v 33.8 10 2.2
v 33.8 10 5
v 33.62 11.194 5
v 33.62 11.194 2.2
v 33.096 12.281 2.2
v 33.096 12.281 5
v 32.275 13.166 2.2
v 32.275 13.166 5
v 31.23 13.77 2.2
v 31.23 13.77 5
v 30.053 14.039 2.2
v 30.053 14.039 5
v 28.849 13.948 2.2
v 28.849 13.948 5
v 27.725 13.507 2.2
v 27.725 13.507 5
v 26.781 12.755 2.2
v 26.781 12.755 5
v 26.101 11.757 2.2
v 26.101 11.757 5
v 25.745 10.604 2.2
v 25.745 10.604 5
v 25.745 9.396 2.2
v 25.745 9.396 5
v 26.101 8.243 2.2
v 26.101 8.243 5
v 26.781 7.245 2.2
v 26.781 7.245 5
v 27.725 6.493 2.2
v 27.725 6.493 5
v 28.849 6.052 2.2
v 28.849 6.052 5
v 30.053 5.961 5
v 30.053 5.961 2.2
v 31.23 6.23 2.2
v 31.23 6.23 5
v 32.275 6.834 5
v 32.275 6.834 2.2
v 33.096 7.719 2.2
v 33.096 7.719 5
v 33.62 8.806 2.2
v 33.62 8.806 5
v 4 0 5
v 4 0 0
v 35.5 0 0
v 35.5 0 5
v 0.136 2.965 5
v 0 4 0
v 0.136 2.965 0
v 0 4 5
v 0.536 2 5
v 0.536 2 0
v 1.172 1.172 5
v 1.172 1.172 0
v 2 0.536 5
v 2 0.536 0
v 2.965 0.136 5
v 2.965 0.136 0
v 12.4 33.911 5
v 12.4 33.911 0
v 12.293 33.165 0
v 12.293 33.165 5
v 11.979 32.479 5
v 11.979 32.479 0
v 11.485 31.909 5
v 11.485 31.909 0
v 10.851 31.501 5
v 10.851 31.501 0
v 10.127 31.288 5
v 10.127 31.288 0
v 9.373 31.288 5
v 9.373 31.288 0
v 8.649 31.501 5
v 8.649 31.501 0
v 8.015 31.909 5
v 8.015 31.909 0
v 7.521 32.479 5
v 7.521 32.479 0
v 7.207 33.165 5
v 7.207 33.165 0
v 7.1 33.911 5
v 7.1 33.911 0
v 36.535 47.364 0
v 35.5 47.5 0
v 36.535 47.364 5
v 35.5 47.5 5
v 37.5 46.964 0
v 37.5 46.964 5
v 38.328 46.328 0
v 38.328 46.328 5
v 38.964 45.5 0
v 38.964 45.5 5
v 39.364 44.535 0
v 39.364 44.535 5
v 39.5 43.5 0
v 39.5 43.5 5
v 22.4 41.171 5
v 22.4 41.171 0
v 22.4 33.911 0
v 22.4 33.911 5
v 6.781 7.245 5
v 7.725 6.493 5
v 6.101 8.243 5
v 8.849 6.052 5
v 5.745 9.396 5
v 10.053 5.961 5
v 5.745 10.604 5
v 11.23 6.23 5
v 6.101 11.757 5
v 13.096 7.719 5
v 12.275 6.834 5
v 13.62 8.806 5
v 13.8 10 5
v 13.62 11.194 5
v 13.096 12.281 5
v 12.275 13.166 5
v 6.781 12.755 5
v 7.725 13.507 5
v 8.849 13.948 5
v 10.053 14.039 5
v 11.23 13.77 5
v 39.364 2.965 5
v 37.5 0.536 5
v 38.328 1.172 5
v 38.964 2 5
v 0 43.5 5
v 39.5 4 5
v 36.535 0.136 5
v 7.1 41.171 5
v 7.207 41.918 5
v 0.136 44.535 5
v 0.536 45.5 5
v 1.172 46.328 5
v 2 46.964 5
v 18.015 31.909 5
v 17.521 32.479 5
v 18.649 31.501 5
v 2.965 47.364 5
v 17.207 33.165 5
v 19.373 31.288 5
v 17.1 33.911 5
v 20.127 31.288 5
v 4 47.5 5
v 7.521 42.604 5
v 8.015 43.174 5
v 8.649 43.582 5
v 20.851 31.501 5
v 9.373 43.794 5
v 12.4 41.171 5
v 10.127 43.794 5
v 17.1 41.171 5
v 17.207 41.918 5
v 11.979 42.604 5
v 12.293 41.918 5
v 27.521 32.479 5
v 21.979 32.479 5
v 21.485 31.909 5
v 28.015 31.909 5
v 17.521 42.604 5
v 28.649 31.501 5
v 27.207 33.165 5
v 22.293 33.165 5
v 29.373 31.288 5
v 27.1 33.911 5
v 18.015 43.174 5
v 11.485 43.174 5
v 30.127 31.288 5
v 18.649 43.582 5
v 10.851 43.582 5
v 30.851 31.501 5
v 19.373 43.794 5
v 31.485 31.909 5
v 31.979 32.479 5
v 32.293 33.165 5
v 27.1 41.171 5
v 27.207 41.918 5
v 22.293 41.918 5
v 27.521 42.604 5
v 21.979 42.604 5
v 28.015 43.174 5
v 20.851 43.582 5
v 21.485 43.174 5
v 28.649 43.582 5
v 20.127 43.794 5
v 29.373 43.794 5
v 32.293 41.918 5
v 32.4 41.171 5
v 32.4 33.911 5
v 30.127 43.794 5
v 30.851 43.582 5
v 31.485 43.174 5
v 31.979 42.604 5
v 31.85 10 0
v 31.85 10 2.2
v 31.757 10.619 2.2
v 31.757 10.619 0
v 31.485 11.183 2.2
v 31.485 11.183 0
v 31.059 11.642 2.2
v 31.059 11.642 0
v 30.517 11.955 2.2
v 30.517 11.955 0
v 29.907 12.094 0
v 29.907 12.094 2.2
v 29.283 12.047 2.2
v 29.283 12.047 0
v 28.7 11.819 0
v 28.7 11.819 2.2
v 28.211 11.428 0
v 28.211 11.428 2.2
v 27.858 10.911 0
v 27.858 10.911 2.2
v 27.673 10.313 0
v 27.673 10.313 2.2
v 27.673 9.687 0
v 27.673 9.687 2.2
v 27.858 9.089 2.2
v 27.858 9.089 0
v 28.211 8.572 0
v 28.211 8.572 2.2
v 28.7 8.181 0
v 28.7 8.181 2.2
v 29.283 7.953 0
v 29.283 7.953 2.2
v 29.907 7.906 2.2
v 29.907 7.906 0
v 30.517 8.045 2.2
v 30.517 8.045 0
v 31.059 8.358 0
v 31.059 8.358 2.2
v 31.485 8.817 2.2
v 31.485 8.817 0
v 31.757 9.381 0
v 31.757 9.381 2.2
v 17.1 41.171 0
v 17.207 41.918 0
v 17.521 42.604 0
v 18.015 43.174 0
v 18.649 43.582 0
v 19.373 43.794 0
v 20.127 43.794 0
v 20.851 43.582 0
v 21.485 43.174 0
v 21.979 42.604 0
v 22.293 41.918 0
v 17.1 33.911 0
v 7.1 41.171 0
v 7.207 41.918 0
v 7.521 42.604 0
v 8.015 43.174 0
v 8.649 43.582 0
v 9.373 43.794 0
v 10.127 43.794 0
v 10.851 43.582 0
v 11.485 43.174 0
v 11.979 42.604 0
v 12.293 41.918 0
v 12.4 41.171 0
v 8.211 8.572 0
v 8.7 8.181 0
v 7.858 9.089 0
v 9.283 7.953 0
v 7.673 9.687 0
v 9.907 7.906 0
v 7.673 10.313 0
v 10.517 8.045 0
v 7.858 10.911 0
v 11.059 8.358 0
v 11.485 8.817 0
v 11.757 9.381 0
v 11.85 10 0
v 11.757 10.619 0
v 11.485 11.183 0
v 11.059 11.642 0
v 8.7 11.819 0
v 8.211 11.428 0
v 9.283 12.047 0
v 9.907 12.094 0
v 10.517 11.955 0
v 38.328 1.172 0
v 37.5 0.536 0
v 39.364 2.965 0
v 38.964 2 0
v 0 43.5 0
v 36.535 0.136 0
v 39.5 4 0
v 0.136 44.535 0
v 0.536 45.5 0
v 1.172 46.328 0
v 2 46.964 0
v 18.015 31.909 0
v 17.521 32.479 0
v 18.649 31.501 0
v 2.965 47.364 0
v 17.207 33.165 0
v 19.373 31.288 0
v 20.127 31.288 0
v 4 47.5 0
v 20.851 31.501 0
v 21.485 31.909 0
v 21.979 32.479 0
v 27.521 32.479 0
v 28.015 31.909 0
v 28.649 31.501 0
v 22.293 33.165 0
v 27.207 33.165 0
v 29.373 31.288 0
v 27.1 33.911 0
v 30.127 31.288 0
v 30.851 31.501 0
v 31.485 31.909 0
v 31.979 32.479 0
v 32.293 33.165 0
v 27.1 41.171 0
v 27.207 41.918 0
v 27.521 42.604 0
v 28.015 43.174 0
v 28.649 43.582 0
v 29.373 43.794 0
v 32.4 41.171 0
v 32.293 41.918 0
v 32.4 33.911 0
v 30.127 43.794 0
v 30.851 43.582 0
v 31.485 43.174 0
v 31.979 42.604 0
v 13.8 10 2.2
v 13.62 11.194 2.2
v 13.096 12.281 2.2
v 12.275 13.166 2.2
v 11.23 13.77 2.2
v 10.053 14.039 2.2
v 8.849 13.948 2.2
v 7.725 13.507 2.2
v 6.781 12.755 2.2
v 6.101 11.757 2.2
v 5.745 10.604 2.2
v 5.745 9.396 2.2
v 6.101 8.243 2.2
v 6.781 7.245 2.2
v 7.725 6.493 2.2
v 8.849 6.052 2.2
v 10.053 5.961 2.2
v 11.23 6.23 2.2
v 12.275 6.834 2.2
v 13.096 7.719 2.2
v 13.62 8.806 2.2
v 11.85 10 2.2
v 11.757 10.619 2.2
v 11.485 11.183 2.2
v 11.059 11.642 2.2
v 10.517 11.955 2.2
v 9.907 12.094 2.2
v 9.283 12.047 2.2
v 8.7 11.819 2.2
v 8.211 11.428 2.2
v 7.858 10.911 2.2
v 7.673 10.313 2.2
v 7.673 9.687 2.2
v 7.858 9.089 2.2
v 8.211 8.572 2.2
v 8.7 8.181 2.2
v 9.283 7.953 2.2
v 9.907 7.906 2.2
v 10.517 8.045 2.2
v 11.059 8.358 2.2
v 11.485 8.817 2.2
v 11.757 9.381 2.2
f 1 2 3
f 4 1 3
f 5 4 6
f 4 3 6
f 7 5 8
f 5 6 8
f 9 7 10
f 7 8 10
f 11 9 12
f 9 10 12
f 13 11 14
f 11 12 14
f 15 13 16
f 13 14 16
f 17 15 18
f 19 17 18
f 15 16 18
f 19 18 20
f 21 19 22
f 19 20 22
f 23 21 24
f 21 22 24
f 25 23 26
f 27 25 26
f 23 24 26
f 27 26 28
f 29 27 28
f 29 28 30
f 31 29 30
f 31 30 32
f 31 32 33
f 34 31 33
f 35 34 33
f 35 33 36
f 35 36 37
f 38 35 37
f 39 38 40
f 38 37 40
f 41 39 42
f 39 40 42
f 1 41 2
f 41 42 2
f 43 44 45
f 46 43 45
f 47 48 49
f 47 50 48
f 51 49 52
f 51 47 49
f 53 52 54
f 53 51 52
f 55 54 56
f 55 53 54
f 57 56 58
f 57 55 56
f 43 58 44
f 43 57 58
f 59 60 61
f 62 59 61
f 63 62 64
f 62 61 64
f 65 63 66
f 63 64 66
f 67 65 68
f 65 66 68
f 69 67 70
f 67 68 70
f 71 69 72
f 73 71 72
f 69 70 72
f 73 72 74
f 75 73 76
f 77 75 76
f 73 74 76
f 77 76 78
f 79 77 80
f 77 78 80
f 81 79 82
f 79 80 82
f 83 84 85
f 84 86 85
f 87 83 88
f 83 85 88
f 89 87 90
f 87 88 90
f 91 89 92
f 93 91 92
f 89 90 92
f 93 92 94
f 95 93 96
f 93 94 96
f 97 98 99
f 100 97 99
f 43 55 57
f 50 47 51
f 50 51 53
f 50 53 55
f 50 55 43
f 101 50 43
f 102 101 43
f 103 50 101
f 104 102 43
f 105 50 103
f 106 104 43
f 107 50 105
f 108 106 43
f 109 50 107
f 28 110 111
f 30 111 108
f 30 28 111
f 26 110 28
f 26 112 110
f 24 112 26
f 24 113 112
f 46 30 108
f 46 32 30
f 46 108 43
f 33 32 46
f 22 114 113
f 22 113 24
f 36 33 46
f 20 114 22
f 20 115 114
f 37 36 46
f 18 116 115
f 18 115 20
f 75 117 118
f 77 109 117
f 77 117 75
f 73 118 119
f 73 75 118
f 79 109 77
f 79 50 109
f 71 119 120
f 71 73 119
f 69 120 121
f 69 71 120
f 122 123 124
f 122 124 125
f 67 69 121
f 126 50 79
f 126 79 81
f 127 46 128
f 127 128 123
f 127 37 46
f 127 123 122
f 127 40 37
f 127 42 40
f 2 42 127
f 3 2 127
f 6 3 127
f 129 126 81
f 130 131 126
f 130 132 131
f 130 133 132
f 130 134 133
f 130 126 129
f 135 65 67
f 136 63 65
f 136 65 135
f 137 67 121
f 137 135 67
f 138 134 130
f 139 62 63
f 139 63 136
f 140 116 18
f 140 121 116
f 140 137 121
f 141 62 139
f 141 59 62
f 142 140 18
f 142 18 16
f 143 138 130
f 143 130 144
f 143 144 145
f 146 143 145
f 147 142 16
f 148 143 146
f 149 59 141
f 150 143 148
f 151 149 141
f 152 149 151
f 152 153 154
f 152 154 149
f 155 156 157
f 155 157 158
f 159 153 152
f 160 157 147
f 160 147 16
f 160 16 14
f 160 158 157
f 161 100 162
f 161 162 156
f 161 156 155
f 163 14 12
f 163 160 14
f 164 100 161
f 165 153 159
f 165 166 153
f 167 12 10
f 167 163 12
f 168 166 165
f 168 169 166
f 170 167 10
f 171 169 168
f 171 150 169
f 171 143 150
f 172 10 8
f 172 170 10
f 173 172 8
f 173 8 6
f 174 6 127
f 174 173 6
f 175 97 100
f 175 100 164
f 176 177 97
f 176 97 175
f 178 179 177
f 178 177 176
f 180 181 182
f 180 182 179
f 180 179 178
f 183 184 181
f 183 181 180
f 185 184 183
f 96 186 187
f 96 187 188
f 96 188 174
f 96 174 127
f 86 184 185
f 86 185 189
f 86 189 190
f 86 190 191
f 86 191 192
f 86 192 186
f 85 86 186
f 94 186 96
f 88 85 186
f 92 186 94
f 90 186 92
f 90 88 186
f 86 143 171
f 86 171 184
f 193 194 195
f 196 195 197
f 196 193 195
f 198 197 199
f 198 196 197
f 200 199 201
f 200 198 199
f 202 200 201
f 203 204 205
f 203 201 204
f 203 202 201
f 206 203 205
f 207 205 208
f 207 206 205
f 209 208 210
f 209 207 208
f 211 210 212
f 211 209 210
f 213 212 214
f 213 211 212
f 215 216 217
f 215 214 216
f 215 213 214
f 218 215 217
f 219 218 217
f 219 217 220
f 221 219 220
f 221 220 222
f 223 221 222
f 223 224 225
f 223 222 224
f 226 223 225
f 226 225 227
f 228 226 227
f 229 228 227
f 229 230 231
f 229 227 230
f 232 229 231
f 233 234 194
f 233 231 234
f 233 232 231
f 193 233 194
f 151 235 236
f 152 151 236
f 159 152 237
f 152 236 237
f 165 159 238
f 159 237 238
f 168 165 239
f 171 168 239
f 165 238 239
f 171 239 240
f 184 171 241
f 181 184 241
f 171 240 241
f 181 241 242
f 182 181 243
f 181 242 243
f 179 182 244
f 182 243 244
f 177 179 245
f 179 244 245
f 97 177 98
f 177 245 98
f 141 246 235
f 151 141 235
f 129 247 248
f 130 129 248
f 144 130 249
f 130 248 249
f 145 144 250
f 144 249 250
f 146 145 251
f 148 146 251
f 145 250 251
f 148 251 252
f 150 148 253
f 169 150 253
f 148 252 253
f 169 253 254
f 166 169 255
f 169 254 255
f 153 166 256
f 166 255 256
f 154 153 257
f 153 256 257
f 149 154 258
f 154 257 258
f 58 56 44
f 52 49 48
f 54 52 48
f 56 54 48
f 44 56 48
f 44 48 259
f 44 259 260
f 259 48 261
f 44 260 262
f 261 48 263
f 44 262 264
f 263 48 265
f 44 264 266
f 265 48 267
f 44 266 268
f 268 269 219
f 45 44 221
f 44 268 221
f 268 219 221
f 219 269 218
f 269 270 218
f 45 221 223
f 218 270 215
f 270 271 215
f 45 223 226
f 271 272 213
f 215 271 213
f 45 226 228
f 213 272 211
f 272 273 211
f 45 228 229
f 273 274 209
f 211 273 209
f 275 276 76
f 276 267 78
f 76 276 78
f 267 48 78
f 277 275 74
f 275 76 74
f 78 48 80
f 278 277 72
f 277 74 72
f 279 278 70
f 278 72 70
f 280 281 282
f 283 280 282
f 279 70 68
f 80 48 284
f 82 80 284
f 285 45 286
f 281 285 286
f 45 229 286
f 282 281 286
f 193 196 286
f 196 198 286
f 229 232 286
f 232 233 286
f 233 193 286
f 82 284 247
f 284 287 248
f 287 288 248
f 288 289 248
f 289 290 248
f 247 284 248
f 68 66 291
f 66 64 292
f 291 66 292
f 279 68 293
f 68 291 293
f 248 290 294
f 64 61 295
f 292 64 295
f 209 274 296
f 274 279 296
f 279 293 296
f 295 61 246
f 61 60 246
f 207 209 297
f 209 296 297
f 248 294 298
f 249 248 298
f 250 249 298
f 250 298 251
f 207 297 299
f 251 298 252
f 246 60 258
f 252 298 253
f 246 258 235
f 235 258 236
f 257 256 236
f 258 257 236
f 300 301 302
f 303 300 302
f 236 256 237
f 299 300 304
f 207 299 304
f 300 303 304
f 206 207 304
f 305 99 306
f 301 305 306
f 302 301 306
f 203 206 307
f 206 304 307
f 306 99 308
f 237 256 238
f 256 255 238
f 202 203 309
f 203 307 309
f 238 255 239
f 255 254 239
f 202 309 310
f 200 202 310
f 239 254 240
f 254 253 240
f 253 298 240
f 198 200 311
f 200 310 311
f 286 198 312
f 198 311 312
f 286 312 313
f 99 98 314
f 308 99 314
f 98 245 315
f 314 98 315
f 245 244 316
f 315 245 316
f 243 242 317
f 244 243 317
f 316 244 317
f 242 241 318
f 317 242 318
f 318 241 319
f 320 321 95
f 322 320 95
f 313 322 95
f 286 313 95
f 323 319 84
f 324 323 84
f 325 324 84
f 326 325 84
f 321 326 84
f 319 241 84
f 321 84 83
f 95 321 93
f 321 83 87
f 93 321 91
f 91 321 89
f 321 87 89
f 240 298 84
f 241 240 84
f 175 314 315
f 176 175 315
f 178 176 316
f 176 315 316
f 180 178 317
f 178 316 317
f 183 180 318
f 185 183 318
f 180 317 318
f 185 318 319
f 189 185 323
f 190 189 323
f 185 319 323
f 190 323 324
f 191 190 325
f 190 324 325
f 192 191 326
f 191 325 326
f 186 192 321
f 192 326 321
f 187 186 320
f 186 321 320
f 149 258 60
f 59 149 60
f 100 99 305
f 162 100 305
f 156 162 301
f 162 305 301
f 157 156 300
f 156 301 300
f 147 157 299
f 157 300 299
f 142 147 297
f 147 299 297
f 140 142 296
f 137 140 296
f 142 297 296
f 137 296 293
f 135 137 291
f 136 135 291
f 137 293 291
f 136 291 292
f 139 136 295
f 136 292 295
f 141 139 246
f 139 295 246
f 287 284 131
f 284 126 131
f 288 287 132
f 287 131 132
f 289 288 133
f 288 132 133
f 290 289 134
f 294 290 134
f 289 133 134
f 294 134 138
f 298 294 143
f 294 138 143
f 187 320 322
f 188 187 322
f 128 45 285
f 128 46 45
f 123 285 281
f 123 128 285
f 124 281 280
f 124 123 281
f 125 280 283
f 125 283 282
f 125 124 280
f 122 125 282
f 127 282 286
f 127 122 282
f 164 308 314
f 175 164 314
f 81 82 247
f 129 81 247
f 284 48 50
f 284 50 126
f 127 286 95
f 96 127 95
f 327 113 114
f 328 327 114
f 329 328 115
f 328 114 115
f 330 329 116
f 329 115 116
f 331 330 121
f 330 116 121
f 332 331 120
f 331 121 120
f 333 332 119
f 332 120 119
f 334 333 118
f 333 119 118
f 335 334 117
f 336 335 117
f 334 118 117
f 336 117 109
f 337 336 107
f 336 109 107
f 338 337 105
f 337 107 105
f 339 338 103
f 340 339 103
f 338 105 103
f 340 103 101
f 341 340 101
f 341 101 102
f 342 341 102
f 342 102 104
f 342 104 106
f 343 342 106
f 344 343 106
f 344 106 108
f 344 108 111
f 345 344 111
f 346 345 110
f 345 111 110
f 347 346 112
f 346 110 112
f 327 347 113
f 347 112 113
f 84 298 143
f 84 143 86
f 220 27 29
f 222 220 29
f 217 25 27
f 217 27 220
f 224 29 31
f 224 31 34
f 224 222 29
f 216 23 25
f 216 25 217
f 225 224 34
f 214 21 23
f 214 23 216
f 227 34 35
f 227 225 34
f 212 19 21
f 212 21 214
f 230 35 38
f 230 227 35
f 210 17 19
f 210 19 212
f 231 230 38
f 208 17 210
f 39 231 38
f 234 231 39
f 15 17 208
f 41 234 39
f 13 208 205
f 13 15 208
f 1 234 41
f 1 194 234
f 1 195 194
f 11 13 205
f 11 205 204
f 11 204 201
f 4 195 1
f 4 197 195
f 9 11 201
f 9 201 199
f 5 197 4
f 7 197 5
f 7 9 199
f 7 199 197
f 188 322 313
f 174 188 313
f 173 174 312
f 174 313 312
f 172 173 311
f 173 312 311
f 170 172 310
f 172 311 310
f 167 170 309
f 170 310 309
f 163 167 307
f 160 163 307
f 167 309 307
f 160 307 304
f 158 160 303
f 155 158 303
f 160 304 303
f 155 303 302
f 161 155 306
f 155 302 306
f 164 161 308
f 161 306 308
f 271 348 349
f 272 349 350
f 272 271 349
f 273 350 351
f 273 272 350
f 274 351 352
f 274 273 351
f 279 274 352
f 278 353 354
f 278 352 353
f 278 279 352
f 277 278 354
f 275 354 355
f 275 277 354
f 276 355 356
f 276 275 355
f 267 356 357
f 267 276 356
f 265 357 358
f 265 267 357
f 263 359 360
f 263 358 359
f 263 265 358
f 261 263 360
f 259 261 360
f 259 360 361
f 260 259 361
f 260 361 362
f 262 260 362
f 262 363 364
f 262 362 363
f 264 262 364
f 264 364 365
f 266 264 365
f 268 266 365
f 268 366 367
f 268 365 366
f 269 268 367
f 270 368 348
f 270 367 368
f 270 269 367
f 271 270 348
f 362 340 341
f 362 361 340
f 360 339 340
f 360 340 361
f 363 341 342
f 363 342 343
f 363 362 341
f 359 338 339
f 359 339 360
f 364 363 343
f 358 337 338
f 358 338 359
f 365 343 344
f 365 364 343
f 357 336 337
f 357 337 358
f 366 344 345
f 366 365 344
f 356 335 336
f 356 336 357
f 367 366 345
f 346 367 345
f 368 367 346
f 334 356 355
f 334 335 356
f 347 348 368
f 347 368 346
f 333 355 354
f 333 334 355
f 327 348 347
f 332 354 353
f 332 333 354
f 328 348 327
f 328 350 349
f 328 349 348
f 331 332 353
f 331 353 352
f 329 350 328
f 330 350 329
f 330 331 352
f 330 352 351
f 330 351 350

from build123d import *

# Parameters (mm, degrees)
CROQUIS2_W              = 39.5
CROQUIS2_H              = 47.5
CROQUIS2_R              = 2.1
SALIENTE_EXTRUIR1_DEPTH = 5
REDONDEO1_R             = 4
CROQUIS3_R              = 4.05
CORTAR_EXTRUIR1_DEPTH   = 2.8


with BuildPart() as part:
    # Croquis2 → Saliente-Extruir1 (new body)
    with BuildSketch(Plane.XY):
        with Locations((19.75, 23.75)):
            Rectangle(CROQUIS2_W, CROQUIS2_H)
        with Locations((9.75, 10)):
            Circle(CROQUIS2_R, mode=Mode.SUBTRACT)
        with Locations((29.75, 10)):
            Circle(CROQUIS2_R, mode=Mode.SUBTRACT)
        with BuildLine():
            Line((12.4, 41.171297972), (12.4, 33.911297972))
            ThreePointArc((12.4, 33.911297972), (9.75, 31.261297972), (7.1, 33.911297972))
            Line((7.1, 33.911297972), (7.1, 41.171297972))
            ThreePointArc((7.1, 41.171297972), (9.75, 43.821297972), (12.4, 41.171297972))
        make_face(mode=Mode.SUBTRACT)
        with BuildLine():
            Line((22.4, 41.171297972), (22.4, 33.911297972))
            ThreePointArc((22.4, 33.911297972), (19.75, 31.261297972), (17.1, 33.911297972))
            Line((17.1, 33.911297972), (17.1, 41.171297972))
            ThreePointArc((17.1, 41.171297972), (19.75, 43.821297972), (22.4, 41.171297972))
        make_face(mode=Mode.SUBTRACT)
        with BuildLine():
            Line((32.4, 41.171297972), (32.4, 33.911297972))
            ThreePointArc((32.4, 33.911297972), (29.75, 31.261297972), (27.1, 33.911297972))
            Line((27.1, 33.911297972), (27.1, 41.171297972))
            ThreePointArc((27.1, 41.171297972), (29.75, 43.821297972), (32.4, 41.171297972))
        make_face(mode=Mode.SUBTRACT)
    extrude(amount=SALIENTE_EXTRUIR1_DEPTH)

    # Redondeo1
    redondeo1_edges = [part.edges().sort_by_distance(p)[0] for p in [
        (0, 47.5, 2.5),
        (39.5, 47.5, 2.5),
        (39.5, 0, 2.5),
        (0, 0, 2.5),
    ]]
    fillet(redondeo1_edges, radius=REDONDEO1_R)

    # Croquis3 → Cortar-Extruir1 (cut)
    with BuildSketch(Plane.XY.offset(5)):
        with Locations((29.75, 10)):
            Circle(CROQUIS3_R)
        with Locations((9.75, 10)):
            Circle(CROQUIS3_R)
    extrude(amount=-CORTAR_EXTRUIR1_DEPTH, mode=Mode.SUBTRACT)


solid = part.part
